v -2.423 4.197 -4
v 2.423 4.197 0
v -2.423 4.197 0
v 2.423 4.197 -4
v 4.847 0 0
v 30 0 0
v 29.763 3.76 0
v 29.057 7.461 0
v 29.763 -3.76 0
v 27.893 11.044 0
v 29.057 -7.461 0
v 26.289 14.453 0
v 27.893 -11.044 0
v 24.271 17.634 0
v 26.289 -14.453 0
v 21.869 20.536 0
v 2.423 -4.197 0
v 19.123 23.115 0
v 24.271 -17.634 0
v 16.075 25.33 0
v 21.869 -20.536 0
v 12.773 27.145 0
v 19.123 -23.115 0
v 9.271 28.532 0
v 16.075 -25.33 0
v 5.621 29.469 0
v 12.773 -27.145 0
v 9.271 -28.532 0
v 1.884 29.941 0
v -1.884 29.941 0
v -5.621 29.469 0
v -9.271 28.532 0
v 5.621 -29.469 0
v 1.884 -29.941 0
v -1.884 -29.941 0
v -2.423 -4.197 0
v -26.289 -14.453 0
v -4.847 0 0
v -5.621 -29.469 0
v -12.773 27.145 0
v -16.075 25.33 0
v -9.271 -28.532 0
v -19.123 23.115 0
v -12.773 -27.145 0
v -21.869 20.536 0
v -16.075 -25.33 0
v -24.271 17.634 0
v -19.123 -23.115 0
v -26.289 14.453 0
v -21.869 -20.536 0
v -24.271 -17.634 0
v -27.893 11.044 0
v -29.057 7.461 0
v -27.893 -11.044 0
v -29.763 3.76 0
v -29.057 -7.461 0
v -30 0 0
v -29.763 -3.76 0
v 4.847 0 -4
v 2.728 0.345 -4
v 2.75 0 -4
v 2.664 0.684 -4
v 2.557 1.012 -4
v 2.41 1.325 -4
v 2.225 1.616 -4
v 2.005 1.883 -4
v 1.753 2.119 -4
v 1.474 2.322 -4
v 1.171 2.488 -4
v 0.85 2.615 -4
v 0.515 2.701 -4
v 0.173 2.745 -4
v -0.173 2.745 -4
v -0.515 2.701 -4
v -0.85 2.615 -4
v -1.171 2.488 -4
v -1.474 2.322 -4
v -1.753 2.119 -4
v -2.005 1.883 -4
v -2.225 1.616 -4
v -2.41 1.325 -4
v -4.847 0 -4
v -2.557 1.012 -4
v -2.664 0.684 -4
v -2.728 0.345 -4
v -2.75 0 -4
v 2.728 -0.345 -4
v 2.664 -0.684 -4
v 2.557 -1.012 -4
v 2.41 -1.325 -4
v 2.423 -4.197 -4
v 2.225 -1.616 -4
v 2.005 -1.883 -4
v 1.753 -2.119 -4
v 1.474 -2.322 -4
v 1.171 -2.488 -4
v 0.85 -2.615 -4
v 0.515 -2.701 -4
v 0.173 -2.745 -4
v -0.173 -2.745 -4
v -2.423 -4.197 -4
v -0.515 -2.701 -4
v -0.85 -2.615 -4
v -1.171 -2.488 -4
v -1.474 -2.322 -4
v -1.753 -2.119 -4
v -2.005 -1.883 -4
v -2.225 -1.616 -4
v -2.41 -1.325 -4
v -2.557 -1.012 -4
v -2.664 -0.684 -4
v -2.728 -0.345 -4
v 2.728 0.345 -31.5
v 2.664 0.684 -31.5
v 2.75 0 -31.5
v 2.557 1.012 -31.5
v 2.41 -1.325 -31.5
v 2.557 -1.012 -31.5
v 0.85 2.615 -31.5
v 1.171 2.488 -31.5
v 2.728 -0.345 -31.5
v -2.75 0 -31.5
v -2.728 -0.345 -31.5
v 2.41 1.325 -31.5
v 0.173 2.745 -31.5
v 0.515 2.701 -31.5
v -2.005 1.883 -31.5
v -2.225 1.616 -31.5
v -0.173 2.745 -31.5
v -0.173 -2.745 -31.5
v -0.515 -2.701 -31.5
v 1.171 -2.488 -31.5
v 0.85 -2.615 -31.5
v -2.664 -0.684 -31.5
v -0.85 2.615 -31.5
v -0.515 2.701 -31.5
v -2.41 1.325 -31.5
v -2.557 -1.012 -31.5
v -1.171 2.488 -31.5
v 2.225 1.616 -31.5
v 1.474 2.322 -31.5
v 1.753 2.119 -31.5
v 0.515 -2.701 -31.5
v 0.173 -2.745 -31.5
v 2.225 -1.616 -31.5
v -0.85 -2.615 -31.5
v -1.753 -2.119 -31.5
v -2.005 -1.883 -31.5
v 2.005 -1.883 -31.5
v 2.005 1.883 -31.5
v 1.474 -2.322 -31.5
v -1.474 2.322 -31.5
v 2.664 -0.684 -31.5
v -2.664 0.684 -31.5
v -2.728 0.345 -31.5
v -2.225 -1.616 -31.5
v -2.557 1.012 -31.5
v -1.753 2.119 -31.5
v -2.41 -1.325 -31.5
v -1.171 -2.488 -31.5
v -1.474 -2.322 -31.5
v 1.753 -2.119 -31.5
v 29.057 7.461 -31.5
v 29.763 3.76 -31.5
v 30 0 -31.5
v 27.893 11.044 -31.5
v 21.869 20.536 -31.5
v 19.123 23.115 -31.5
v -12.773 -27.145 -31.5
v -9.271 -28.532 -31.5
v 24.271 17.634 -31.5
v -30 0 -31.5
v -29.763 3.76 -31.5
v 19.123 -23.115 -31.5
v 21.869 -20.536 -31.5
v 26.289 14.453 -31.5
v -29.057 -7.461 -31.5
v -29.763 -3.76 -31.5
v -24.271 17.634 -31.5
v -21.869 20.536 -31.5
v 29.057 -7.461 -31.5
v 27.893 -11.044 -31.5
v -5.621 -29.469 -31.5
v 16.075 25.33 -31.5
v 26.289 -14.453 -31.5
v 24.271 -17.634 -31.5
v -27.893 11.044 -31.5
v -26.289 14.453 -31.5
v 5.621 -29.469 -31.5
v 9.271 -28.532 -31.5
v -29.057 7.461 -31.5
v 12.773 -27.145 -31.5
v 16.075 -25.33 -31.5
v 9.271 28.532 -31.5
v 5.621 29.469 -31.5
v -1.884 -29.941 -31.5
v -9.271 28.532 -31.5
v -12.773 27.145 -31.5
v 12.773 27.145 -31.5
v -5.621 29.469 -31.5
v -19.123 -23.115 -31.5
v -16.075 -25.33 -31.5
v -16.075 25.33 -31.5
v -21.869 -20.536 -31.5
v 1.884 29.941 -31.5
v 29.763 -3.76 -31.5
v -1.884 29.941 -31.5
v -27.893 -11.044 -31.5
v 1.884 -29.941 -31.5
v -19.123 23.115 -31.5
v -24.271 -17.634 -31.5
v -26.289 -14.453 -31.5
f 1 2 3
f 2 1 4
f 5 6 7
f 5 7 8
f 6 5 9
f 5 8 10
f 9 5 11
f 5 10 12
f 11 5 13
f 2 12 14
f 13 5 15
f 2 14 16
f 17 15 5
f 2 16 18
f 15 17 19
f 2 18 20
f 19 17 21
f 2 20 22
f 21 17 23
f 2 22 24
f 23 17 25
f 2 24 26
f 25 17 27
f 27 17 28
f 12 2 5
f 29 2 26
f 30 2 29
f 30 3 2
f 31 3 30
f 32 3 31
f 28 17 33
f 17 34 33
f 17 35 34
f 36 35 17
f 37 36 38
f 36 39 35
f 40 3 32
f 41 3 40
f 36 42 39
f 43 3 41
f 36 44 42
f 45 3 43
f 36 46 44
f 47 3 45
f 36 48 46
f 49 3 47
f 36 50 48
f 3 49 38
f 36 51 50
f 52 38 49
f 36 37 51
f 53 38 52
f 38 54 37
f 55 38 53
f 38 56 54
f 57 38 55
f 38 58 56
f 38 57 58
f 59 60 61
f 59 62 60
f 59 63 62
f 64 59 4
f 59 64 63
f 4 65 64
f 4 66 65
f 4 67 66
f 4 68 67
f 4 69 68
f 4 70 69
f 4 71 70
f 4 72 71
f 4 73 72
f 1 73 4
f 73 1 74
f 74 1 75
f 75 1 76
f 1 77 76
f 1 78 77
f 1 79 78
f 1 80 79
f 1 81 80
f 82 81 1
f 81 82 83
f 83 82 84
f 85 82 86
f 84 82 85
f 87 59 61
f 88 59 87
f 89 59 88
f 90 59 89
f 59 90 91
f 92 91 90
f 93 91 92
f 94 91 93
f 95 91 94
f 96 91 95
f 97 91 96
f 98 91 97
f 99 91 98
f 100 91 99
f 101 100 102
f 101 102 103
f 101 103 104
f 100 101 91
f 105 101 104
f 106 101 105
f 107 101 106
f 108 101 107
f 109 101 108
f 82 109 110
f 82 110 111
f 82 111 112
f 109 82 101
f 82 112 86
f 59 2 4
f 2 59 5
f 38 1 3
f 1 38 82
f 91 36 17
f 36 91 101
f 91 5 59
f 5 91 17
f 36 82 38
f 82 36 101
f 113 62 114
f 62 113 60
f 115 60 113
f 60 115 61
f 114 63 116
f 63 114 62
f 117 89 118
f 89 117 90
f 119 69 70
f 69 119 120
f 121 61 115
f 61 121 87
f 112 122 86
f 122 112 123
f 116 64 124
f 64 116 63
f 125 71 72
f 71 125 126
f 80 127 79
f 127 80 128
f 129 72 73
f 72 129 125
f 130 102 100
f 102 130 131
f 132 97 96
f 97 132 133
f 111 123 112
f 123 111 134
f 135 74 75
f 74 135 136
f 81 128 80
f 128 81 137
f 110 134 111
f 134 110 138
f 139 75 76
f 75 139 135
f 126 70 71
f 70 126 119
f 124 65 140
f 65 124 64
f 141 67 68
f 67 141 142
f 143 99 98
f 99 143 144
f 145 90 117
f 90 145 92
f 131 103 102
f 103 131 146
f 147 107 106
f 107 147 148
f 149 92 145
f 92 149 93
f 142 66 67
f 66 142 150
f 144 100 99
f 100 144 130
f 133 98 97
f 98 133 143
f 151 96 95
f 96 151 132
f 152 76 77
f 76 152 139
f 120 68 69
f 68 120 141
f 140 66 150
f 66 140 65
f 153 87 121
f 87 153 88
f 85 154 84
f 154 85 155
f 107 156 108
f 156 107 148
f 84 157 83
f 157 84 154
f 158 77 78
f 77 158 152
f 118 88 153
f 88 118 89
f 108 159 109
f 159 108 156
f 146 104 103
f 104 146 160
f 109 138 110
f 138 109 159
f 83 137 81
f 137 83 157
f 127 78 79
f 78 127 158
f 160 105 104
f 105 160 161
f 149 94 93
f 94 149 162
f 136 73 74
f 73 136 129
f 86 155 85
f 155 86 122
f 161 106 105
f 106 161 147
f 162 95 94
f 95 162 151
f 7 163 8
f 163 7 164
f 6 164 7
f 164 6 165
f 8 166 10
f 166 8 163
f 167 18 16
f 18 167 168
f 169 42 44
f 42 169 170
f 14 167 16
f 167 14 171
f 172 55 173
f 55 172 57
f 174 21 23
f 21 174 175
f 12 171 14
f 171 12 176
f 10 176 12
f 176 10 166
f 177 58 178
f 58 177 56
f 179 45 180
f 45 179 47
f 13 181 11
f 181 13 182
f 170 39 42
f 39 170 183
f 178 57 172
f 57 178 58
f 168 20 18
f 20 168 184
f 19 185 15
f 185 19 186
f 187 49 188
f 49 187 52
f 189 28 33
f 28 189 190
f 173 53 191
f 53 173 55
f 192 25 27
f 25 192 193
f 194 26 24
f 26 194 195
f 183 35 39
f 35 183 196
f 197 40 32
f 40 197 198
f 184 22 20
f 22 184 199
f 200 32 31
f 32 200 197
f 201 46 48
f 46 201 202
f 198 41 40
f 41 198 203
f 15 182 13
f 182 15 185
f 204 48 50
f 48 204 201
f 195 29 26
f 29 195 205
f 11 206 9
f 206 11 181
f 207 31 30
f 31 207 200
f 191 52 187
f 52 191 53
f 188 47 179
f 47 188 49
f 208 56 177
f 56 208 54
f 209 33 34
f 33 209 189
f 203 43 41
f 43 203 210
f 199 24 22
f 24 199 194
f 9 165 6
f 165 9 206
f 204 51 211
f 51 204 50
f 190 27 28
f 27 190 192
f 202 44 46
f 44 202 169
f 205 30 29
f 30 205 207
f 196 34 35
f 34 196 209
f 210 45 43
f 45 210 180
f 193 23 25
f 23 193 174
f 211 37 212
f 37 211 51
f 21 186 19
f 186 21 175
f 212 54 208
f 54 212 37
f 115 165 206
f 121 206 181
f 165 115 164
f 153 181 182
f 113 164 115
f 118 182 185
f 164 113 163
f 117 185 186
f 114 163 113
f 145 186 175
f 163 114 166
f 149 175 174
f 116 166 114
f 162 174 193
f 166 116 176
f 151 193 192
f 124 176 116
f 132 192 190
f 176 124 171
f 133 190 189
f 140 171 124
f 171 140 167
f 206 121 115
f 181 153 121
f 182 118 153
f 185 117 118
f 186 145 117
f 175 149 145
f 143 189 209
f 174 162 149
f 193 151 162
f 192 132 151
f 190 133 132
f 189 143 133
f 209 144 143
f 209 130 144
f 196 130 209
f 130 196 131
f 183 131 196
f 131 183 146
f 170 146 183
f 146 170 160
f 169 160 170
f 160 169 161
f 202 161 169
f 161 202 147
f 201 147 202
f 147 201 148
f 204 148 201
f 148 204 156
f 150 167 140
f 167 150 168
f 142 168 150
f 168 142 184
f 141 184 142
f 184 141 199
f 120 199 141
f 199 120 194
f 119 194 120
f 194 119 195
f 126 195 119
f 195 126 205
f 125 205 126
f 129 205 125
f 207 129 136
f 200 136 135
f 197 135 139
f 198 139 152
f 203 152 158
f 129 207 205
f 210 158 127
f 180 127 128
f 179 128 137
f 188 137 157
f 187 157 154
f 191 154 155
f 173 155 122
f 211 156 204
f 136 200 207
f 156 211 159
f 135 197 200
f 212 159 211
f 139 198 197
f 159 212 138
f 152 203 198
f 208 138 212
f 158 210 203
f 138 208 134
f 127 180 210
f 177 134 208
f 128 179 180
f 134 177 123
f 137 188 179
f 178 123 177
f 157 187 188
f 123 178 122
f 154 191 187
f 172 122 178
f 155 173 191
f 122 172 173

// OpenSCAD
$fn = 50;

difference() {
	union() {
		translate(v = [0, 0, -31.5]) {
			cylinder(h = 31.5, r = 30.0);
		}
	}
	union() {
		translate(v = [0, 0, 0]) {
			rotate(a = [0, 0, 0]) {
				difference() {
					union() {
						translate(v = [0, 0, -4]) {
							linear_extrude(height = 4) {
								polygon(points = [[4.8468, 0.0], [2.4234000000000004, 4.197451927062417], [-2.423399999999999, 4.197451927062417], [-4.8468, 5.935618106107392e-16], [-2.423400000000002, -4.197451927062416], [2.423399999999997, -4.197451927062419]]);
							}
						}
					}
					union();
				}
			}
		}
		#translate(v = [0, 0, -100.0]) {
			cylinder(h = 200, r = 2.75);
		}
	}
}
